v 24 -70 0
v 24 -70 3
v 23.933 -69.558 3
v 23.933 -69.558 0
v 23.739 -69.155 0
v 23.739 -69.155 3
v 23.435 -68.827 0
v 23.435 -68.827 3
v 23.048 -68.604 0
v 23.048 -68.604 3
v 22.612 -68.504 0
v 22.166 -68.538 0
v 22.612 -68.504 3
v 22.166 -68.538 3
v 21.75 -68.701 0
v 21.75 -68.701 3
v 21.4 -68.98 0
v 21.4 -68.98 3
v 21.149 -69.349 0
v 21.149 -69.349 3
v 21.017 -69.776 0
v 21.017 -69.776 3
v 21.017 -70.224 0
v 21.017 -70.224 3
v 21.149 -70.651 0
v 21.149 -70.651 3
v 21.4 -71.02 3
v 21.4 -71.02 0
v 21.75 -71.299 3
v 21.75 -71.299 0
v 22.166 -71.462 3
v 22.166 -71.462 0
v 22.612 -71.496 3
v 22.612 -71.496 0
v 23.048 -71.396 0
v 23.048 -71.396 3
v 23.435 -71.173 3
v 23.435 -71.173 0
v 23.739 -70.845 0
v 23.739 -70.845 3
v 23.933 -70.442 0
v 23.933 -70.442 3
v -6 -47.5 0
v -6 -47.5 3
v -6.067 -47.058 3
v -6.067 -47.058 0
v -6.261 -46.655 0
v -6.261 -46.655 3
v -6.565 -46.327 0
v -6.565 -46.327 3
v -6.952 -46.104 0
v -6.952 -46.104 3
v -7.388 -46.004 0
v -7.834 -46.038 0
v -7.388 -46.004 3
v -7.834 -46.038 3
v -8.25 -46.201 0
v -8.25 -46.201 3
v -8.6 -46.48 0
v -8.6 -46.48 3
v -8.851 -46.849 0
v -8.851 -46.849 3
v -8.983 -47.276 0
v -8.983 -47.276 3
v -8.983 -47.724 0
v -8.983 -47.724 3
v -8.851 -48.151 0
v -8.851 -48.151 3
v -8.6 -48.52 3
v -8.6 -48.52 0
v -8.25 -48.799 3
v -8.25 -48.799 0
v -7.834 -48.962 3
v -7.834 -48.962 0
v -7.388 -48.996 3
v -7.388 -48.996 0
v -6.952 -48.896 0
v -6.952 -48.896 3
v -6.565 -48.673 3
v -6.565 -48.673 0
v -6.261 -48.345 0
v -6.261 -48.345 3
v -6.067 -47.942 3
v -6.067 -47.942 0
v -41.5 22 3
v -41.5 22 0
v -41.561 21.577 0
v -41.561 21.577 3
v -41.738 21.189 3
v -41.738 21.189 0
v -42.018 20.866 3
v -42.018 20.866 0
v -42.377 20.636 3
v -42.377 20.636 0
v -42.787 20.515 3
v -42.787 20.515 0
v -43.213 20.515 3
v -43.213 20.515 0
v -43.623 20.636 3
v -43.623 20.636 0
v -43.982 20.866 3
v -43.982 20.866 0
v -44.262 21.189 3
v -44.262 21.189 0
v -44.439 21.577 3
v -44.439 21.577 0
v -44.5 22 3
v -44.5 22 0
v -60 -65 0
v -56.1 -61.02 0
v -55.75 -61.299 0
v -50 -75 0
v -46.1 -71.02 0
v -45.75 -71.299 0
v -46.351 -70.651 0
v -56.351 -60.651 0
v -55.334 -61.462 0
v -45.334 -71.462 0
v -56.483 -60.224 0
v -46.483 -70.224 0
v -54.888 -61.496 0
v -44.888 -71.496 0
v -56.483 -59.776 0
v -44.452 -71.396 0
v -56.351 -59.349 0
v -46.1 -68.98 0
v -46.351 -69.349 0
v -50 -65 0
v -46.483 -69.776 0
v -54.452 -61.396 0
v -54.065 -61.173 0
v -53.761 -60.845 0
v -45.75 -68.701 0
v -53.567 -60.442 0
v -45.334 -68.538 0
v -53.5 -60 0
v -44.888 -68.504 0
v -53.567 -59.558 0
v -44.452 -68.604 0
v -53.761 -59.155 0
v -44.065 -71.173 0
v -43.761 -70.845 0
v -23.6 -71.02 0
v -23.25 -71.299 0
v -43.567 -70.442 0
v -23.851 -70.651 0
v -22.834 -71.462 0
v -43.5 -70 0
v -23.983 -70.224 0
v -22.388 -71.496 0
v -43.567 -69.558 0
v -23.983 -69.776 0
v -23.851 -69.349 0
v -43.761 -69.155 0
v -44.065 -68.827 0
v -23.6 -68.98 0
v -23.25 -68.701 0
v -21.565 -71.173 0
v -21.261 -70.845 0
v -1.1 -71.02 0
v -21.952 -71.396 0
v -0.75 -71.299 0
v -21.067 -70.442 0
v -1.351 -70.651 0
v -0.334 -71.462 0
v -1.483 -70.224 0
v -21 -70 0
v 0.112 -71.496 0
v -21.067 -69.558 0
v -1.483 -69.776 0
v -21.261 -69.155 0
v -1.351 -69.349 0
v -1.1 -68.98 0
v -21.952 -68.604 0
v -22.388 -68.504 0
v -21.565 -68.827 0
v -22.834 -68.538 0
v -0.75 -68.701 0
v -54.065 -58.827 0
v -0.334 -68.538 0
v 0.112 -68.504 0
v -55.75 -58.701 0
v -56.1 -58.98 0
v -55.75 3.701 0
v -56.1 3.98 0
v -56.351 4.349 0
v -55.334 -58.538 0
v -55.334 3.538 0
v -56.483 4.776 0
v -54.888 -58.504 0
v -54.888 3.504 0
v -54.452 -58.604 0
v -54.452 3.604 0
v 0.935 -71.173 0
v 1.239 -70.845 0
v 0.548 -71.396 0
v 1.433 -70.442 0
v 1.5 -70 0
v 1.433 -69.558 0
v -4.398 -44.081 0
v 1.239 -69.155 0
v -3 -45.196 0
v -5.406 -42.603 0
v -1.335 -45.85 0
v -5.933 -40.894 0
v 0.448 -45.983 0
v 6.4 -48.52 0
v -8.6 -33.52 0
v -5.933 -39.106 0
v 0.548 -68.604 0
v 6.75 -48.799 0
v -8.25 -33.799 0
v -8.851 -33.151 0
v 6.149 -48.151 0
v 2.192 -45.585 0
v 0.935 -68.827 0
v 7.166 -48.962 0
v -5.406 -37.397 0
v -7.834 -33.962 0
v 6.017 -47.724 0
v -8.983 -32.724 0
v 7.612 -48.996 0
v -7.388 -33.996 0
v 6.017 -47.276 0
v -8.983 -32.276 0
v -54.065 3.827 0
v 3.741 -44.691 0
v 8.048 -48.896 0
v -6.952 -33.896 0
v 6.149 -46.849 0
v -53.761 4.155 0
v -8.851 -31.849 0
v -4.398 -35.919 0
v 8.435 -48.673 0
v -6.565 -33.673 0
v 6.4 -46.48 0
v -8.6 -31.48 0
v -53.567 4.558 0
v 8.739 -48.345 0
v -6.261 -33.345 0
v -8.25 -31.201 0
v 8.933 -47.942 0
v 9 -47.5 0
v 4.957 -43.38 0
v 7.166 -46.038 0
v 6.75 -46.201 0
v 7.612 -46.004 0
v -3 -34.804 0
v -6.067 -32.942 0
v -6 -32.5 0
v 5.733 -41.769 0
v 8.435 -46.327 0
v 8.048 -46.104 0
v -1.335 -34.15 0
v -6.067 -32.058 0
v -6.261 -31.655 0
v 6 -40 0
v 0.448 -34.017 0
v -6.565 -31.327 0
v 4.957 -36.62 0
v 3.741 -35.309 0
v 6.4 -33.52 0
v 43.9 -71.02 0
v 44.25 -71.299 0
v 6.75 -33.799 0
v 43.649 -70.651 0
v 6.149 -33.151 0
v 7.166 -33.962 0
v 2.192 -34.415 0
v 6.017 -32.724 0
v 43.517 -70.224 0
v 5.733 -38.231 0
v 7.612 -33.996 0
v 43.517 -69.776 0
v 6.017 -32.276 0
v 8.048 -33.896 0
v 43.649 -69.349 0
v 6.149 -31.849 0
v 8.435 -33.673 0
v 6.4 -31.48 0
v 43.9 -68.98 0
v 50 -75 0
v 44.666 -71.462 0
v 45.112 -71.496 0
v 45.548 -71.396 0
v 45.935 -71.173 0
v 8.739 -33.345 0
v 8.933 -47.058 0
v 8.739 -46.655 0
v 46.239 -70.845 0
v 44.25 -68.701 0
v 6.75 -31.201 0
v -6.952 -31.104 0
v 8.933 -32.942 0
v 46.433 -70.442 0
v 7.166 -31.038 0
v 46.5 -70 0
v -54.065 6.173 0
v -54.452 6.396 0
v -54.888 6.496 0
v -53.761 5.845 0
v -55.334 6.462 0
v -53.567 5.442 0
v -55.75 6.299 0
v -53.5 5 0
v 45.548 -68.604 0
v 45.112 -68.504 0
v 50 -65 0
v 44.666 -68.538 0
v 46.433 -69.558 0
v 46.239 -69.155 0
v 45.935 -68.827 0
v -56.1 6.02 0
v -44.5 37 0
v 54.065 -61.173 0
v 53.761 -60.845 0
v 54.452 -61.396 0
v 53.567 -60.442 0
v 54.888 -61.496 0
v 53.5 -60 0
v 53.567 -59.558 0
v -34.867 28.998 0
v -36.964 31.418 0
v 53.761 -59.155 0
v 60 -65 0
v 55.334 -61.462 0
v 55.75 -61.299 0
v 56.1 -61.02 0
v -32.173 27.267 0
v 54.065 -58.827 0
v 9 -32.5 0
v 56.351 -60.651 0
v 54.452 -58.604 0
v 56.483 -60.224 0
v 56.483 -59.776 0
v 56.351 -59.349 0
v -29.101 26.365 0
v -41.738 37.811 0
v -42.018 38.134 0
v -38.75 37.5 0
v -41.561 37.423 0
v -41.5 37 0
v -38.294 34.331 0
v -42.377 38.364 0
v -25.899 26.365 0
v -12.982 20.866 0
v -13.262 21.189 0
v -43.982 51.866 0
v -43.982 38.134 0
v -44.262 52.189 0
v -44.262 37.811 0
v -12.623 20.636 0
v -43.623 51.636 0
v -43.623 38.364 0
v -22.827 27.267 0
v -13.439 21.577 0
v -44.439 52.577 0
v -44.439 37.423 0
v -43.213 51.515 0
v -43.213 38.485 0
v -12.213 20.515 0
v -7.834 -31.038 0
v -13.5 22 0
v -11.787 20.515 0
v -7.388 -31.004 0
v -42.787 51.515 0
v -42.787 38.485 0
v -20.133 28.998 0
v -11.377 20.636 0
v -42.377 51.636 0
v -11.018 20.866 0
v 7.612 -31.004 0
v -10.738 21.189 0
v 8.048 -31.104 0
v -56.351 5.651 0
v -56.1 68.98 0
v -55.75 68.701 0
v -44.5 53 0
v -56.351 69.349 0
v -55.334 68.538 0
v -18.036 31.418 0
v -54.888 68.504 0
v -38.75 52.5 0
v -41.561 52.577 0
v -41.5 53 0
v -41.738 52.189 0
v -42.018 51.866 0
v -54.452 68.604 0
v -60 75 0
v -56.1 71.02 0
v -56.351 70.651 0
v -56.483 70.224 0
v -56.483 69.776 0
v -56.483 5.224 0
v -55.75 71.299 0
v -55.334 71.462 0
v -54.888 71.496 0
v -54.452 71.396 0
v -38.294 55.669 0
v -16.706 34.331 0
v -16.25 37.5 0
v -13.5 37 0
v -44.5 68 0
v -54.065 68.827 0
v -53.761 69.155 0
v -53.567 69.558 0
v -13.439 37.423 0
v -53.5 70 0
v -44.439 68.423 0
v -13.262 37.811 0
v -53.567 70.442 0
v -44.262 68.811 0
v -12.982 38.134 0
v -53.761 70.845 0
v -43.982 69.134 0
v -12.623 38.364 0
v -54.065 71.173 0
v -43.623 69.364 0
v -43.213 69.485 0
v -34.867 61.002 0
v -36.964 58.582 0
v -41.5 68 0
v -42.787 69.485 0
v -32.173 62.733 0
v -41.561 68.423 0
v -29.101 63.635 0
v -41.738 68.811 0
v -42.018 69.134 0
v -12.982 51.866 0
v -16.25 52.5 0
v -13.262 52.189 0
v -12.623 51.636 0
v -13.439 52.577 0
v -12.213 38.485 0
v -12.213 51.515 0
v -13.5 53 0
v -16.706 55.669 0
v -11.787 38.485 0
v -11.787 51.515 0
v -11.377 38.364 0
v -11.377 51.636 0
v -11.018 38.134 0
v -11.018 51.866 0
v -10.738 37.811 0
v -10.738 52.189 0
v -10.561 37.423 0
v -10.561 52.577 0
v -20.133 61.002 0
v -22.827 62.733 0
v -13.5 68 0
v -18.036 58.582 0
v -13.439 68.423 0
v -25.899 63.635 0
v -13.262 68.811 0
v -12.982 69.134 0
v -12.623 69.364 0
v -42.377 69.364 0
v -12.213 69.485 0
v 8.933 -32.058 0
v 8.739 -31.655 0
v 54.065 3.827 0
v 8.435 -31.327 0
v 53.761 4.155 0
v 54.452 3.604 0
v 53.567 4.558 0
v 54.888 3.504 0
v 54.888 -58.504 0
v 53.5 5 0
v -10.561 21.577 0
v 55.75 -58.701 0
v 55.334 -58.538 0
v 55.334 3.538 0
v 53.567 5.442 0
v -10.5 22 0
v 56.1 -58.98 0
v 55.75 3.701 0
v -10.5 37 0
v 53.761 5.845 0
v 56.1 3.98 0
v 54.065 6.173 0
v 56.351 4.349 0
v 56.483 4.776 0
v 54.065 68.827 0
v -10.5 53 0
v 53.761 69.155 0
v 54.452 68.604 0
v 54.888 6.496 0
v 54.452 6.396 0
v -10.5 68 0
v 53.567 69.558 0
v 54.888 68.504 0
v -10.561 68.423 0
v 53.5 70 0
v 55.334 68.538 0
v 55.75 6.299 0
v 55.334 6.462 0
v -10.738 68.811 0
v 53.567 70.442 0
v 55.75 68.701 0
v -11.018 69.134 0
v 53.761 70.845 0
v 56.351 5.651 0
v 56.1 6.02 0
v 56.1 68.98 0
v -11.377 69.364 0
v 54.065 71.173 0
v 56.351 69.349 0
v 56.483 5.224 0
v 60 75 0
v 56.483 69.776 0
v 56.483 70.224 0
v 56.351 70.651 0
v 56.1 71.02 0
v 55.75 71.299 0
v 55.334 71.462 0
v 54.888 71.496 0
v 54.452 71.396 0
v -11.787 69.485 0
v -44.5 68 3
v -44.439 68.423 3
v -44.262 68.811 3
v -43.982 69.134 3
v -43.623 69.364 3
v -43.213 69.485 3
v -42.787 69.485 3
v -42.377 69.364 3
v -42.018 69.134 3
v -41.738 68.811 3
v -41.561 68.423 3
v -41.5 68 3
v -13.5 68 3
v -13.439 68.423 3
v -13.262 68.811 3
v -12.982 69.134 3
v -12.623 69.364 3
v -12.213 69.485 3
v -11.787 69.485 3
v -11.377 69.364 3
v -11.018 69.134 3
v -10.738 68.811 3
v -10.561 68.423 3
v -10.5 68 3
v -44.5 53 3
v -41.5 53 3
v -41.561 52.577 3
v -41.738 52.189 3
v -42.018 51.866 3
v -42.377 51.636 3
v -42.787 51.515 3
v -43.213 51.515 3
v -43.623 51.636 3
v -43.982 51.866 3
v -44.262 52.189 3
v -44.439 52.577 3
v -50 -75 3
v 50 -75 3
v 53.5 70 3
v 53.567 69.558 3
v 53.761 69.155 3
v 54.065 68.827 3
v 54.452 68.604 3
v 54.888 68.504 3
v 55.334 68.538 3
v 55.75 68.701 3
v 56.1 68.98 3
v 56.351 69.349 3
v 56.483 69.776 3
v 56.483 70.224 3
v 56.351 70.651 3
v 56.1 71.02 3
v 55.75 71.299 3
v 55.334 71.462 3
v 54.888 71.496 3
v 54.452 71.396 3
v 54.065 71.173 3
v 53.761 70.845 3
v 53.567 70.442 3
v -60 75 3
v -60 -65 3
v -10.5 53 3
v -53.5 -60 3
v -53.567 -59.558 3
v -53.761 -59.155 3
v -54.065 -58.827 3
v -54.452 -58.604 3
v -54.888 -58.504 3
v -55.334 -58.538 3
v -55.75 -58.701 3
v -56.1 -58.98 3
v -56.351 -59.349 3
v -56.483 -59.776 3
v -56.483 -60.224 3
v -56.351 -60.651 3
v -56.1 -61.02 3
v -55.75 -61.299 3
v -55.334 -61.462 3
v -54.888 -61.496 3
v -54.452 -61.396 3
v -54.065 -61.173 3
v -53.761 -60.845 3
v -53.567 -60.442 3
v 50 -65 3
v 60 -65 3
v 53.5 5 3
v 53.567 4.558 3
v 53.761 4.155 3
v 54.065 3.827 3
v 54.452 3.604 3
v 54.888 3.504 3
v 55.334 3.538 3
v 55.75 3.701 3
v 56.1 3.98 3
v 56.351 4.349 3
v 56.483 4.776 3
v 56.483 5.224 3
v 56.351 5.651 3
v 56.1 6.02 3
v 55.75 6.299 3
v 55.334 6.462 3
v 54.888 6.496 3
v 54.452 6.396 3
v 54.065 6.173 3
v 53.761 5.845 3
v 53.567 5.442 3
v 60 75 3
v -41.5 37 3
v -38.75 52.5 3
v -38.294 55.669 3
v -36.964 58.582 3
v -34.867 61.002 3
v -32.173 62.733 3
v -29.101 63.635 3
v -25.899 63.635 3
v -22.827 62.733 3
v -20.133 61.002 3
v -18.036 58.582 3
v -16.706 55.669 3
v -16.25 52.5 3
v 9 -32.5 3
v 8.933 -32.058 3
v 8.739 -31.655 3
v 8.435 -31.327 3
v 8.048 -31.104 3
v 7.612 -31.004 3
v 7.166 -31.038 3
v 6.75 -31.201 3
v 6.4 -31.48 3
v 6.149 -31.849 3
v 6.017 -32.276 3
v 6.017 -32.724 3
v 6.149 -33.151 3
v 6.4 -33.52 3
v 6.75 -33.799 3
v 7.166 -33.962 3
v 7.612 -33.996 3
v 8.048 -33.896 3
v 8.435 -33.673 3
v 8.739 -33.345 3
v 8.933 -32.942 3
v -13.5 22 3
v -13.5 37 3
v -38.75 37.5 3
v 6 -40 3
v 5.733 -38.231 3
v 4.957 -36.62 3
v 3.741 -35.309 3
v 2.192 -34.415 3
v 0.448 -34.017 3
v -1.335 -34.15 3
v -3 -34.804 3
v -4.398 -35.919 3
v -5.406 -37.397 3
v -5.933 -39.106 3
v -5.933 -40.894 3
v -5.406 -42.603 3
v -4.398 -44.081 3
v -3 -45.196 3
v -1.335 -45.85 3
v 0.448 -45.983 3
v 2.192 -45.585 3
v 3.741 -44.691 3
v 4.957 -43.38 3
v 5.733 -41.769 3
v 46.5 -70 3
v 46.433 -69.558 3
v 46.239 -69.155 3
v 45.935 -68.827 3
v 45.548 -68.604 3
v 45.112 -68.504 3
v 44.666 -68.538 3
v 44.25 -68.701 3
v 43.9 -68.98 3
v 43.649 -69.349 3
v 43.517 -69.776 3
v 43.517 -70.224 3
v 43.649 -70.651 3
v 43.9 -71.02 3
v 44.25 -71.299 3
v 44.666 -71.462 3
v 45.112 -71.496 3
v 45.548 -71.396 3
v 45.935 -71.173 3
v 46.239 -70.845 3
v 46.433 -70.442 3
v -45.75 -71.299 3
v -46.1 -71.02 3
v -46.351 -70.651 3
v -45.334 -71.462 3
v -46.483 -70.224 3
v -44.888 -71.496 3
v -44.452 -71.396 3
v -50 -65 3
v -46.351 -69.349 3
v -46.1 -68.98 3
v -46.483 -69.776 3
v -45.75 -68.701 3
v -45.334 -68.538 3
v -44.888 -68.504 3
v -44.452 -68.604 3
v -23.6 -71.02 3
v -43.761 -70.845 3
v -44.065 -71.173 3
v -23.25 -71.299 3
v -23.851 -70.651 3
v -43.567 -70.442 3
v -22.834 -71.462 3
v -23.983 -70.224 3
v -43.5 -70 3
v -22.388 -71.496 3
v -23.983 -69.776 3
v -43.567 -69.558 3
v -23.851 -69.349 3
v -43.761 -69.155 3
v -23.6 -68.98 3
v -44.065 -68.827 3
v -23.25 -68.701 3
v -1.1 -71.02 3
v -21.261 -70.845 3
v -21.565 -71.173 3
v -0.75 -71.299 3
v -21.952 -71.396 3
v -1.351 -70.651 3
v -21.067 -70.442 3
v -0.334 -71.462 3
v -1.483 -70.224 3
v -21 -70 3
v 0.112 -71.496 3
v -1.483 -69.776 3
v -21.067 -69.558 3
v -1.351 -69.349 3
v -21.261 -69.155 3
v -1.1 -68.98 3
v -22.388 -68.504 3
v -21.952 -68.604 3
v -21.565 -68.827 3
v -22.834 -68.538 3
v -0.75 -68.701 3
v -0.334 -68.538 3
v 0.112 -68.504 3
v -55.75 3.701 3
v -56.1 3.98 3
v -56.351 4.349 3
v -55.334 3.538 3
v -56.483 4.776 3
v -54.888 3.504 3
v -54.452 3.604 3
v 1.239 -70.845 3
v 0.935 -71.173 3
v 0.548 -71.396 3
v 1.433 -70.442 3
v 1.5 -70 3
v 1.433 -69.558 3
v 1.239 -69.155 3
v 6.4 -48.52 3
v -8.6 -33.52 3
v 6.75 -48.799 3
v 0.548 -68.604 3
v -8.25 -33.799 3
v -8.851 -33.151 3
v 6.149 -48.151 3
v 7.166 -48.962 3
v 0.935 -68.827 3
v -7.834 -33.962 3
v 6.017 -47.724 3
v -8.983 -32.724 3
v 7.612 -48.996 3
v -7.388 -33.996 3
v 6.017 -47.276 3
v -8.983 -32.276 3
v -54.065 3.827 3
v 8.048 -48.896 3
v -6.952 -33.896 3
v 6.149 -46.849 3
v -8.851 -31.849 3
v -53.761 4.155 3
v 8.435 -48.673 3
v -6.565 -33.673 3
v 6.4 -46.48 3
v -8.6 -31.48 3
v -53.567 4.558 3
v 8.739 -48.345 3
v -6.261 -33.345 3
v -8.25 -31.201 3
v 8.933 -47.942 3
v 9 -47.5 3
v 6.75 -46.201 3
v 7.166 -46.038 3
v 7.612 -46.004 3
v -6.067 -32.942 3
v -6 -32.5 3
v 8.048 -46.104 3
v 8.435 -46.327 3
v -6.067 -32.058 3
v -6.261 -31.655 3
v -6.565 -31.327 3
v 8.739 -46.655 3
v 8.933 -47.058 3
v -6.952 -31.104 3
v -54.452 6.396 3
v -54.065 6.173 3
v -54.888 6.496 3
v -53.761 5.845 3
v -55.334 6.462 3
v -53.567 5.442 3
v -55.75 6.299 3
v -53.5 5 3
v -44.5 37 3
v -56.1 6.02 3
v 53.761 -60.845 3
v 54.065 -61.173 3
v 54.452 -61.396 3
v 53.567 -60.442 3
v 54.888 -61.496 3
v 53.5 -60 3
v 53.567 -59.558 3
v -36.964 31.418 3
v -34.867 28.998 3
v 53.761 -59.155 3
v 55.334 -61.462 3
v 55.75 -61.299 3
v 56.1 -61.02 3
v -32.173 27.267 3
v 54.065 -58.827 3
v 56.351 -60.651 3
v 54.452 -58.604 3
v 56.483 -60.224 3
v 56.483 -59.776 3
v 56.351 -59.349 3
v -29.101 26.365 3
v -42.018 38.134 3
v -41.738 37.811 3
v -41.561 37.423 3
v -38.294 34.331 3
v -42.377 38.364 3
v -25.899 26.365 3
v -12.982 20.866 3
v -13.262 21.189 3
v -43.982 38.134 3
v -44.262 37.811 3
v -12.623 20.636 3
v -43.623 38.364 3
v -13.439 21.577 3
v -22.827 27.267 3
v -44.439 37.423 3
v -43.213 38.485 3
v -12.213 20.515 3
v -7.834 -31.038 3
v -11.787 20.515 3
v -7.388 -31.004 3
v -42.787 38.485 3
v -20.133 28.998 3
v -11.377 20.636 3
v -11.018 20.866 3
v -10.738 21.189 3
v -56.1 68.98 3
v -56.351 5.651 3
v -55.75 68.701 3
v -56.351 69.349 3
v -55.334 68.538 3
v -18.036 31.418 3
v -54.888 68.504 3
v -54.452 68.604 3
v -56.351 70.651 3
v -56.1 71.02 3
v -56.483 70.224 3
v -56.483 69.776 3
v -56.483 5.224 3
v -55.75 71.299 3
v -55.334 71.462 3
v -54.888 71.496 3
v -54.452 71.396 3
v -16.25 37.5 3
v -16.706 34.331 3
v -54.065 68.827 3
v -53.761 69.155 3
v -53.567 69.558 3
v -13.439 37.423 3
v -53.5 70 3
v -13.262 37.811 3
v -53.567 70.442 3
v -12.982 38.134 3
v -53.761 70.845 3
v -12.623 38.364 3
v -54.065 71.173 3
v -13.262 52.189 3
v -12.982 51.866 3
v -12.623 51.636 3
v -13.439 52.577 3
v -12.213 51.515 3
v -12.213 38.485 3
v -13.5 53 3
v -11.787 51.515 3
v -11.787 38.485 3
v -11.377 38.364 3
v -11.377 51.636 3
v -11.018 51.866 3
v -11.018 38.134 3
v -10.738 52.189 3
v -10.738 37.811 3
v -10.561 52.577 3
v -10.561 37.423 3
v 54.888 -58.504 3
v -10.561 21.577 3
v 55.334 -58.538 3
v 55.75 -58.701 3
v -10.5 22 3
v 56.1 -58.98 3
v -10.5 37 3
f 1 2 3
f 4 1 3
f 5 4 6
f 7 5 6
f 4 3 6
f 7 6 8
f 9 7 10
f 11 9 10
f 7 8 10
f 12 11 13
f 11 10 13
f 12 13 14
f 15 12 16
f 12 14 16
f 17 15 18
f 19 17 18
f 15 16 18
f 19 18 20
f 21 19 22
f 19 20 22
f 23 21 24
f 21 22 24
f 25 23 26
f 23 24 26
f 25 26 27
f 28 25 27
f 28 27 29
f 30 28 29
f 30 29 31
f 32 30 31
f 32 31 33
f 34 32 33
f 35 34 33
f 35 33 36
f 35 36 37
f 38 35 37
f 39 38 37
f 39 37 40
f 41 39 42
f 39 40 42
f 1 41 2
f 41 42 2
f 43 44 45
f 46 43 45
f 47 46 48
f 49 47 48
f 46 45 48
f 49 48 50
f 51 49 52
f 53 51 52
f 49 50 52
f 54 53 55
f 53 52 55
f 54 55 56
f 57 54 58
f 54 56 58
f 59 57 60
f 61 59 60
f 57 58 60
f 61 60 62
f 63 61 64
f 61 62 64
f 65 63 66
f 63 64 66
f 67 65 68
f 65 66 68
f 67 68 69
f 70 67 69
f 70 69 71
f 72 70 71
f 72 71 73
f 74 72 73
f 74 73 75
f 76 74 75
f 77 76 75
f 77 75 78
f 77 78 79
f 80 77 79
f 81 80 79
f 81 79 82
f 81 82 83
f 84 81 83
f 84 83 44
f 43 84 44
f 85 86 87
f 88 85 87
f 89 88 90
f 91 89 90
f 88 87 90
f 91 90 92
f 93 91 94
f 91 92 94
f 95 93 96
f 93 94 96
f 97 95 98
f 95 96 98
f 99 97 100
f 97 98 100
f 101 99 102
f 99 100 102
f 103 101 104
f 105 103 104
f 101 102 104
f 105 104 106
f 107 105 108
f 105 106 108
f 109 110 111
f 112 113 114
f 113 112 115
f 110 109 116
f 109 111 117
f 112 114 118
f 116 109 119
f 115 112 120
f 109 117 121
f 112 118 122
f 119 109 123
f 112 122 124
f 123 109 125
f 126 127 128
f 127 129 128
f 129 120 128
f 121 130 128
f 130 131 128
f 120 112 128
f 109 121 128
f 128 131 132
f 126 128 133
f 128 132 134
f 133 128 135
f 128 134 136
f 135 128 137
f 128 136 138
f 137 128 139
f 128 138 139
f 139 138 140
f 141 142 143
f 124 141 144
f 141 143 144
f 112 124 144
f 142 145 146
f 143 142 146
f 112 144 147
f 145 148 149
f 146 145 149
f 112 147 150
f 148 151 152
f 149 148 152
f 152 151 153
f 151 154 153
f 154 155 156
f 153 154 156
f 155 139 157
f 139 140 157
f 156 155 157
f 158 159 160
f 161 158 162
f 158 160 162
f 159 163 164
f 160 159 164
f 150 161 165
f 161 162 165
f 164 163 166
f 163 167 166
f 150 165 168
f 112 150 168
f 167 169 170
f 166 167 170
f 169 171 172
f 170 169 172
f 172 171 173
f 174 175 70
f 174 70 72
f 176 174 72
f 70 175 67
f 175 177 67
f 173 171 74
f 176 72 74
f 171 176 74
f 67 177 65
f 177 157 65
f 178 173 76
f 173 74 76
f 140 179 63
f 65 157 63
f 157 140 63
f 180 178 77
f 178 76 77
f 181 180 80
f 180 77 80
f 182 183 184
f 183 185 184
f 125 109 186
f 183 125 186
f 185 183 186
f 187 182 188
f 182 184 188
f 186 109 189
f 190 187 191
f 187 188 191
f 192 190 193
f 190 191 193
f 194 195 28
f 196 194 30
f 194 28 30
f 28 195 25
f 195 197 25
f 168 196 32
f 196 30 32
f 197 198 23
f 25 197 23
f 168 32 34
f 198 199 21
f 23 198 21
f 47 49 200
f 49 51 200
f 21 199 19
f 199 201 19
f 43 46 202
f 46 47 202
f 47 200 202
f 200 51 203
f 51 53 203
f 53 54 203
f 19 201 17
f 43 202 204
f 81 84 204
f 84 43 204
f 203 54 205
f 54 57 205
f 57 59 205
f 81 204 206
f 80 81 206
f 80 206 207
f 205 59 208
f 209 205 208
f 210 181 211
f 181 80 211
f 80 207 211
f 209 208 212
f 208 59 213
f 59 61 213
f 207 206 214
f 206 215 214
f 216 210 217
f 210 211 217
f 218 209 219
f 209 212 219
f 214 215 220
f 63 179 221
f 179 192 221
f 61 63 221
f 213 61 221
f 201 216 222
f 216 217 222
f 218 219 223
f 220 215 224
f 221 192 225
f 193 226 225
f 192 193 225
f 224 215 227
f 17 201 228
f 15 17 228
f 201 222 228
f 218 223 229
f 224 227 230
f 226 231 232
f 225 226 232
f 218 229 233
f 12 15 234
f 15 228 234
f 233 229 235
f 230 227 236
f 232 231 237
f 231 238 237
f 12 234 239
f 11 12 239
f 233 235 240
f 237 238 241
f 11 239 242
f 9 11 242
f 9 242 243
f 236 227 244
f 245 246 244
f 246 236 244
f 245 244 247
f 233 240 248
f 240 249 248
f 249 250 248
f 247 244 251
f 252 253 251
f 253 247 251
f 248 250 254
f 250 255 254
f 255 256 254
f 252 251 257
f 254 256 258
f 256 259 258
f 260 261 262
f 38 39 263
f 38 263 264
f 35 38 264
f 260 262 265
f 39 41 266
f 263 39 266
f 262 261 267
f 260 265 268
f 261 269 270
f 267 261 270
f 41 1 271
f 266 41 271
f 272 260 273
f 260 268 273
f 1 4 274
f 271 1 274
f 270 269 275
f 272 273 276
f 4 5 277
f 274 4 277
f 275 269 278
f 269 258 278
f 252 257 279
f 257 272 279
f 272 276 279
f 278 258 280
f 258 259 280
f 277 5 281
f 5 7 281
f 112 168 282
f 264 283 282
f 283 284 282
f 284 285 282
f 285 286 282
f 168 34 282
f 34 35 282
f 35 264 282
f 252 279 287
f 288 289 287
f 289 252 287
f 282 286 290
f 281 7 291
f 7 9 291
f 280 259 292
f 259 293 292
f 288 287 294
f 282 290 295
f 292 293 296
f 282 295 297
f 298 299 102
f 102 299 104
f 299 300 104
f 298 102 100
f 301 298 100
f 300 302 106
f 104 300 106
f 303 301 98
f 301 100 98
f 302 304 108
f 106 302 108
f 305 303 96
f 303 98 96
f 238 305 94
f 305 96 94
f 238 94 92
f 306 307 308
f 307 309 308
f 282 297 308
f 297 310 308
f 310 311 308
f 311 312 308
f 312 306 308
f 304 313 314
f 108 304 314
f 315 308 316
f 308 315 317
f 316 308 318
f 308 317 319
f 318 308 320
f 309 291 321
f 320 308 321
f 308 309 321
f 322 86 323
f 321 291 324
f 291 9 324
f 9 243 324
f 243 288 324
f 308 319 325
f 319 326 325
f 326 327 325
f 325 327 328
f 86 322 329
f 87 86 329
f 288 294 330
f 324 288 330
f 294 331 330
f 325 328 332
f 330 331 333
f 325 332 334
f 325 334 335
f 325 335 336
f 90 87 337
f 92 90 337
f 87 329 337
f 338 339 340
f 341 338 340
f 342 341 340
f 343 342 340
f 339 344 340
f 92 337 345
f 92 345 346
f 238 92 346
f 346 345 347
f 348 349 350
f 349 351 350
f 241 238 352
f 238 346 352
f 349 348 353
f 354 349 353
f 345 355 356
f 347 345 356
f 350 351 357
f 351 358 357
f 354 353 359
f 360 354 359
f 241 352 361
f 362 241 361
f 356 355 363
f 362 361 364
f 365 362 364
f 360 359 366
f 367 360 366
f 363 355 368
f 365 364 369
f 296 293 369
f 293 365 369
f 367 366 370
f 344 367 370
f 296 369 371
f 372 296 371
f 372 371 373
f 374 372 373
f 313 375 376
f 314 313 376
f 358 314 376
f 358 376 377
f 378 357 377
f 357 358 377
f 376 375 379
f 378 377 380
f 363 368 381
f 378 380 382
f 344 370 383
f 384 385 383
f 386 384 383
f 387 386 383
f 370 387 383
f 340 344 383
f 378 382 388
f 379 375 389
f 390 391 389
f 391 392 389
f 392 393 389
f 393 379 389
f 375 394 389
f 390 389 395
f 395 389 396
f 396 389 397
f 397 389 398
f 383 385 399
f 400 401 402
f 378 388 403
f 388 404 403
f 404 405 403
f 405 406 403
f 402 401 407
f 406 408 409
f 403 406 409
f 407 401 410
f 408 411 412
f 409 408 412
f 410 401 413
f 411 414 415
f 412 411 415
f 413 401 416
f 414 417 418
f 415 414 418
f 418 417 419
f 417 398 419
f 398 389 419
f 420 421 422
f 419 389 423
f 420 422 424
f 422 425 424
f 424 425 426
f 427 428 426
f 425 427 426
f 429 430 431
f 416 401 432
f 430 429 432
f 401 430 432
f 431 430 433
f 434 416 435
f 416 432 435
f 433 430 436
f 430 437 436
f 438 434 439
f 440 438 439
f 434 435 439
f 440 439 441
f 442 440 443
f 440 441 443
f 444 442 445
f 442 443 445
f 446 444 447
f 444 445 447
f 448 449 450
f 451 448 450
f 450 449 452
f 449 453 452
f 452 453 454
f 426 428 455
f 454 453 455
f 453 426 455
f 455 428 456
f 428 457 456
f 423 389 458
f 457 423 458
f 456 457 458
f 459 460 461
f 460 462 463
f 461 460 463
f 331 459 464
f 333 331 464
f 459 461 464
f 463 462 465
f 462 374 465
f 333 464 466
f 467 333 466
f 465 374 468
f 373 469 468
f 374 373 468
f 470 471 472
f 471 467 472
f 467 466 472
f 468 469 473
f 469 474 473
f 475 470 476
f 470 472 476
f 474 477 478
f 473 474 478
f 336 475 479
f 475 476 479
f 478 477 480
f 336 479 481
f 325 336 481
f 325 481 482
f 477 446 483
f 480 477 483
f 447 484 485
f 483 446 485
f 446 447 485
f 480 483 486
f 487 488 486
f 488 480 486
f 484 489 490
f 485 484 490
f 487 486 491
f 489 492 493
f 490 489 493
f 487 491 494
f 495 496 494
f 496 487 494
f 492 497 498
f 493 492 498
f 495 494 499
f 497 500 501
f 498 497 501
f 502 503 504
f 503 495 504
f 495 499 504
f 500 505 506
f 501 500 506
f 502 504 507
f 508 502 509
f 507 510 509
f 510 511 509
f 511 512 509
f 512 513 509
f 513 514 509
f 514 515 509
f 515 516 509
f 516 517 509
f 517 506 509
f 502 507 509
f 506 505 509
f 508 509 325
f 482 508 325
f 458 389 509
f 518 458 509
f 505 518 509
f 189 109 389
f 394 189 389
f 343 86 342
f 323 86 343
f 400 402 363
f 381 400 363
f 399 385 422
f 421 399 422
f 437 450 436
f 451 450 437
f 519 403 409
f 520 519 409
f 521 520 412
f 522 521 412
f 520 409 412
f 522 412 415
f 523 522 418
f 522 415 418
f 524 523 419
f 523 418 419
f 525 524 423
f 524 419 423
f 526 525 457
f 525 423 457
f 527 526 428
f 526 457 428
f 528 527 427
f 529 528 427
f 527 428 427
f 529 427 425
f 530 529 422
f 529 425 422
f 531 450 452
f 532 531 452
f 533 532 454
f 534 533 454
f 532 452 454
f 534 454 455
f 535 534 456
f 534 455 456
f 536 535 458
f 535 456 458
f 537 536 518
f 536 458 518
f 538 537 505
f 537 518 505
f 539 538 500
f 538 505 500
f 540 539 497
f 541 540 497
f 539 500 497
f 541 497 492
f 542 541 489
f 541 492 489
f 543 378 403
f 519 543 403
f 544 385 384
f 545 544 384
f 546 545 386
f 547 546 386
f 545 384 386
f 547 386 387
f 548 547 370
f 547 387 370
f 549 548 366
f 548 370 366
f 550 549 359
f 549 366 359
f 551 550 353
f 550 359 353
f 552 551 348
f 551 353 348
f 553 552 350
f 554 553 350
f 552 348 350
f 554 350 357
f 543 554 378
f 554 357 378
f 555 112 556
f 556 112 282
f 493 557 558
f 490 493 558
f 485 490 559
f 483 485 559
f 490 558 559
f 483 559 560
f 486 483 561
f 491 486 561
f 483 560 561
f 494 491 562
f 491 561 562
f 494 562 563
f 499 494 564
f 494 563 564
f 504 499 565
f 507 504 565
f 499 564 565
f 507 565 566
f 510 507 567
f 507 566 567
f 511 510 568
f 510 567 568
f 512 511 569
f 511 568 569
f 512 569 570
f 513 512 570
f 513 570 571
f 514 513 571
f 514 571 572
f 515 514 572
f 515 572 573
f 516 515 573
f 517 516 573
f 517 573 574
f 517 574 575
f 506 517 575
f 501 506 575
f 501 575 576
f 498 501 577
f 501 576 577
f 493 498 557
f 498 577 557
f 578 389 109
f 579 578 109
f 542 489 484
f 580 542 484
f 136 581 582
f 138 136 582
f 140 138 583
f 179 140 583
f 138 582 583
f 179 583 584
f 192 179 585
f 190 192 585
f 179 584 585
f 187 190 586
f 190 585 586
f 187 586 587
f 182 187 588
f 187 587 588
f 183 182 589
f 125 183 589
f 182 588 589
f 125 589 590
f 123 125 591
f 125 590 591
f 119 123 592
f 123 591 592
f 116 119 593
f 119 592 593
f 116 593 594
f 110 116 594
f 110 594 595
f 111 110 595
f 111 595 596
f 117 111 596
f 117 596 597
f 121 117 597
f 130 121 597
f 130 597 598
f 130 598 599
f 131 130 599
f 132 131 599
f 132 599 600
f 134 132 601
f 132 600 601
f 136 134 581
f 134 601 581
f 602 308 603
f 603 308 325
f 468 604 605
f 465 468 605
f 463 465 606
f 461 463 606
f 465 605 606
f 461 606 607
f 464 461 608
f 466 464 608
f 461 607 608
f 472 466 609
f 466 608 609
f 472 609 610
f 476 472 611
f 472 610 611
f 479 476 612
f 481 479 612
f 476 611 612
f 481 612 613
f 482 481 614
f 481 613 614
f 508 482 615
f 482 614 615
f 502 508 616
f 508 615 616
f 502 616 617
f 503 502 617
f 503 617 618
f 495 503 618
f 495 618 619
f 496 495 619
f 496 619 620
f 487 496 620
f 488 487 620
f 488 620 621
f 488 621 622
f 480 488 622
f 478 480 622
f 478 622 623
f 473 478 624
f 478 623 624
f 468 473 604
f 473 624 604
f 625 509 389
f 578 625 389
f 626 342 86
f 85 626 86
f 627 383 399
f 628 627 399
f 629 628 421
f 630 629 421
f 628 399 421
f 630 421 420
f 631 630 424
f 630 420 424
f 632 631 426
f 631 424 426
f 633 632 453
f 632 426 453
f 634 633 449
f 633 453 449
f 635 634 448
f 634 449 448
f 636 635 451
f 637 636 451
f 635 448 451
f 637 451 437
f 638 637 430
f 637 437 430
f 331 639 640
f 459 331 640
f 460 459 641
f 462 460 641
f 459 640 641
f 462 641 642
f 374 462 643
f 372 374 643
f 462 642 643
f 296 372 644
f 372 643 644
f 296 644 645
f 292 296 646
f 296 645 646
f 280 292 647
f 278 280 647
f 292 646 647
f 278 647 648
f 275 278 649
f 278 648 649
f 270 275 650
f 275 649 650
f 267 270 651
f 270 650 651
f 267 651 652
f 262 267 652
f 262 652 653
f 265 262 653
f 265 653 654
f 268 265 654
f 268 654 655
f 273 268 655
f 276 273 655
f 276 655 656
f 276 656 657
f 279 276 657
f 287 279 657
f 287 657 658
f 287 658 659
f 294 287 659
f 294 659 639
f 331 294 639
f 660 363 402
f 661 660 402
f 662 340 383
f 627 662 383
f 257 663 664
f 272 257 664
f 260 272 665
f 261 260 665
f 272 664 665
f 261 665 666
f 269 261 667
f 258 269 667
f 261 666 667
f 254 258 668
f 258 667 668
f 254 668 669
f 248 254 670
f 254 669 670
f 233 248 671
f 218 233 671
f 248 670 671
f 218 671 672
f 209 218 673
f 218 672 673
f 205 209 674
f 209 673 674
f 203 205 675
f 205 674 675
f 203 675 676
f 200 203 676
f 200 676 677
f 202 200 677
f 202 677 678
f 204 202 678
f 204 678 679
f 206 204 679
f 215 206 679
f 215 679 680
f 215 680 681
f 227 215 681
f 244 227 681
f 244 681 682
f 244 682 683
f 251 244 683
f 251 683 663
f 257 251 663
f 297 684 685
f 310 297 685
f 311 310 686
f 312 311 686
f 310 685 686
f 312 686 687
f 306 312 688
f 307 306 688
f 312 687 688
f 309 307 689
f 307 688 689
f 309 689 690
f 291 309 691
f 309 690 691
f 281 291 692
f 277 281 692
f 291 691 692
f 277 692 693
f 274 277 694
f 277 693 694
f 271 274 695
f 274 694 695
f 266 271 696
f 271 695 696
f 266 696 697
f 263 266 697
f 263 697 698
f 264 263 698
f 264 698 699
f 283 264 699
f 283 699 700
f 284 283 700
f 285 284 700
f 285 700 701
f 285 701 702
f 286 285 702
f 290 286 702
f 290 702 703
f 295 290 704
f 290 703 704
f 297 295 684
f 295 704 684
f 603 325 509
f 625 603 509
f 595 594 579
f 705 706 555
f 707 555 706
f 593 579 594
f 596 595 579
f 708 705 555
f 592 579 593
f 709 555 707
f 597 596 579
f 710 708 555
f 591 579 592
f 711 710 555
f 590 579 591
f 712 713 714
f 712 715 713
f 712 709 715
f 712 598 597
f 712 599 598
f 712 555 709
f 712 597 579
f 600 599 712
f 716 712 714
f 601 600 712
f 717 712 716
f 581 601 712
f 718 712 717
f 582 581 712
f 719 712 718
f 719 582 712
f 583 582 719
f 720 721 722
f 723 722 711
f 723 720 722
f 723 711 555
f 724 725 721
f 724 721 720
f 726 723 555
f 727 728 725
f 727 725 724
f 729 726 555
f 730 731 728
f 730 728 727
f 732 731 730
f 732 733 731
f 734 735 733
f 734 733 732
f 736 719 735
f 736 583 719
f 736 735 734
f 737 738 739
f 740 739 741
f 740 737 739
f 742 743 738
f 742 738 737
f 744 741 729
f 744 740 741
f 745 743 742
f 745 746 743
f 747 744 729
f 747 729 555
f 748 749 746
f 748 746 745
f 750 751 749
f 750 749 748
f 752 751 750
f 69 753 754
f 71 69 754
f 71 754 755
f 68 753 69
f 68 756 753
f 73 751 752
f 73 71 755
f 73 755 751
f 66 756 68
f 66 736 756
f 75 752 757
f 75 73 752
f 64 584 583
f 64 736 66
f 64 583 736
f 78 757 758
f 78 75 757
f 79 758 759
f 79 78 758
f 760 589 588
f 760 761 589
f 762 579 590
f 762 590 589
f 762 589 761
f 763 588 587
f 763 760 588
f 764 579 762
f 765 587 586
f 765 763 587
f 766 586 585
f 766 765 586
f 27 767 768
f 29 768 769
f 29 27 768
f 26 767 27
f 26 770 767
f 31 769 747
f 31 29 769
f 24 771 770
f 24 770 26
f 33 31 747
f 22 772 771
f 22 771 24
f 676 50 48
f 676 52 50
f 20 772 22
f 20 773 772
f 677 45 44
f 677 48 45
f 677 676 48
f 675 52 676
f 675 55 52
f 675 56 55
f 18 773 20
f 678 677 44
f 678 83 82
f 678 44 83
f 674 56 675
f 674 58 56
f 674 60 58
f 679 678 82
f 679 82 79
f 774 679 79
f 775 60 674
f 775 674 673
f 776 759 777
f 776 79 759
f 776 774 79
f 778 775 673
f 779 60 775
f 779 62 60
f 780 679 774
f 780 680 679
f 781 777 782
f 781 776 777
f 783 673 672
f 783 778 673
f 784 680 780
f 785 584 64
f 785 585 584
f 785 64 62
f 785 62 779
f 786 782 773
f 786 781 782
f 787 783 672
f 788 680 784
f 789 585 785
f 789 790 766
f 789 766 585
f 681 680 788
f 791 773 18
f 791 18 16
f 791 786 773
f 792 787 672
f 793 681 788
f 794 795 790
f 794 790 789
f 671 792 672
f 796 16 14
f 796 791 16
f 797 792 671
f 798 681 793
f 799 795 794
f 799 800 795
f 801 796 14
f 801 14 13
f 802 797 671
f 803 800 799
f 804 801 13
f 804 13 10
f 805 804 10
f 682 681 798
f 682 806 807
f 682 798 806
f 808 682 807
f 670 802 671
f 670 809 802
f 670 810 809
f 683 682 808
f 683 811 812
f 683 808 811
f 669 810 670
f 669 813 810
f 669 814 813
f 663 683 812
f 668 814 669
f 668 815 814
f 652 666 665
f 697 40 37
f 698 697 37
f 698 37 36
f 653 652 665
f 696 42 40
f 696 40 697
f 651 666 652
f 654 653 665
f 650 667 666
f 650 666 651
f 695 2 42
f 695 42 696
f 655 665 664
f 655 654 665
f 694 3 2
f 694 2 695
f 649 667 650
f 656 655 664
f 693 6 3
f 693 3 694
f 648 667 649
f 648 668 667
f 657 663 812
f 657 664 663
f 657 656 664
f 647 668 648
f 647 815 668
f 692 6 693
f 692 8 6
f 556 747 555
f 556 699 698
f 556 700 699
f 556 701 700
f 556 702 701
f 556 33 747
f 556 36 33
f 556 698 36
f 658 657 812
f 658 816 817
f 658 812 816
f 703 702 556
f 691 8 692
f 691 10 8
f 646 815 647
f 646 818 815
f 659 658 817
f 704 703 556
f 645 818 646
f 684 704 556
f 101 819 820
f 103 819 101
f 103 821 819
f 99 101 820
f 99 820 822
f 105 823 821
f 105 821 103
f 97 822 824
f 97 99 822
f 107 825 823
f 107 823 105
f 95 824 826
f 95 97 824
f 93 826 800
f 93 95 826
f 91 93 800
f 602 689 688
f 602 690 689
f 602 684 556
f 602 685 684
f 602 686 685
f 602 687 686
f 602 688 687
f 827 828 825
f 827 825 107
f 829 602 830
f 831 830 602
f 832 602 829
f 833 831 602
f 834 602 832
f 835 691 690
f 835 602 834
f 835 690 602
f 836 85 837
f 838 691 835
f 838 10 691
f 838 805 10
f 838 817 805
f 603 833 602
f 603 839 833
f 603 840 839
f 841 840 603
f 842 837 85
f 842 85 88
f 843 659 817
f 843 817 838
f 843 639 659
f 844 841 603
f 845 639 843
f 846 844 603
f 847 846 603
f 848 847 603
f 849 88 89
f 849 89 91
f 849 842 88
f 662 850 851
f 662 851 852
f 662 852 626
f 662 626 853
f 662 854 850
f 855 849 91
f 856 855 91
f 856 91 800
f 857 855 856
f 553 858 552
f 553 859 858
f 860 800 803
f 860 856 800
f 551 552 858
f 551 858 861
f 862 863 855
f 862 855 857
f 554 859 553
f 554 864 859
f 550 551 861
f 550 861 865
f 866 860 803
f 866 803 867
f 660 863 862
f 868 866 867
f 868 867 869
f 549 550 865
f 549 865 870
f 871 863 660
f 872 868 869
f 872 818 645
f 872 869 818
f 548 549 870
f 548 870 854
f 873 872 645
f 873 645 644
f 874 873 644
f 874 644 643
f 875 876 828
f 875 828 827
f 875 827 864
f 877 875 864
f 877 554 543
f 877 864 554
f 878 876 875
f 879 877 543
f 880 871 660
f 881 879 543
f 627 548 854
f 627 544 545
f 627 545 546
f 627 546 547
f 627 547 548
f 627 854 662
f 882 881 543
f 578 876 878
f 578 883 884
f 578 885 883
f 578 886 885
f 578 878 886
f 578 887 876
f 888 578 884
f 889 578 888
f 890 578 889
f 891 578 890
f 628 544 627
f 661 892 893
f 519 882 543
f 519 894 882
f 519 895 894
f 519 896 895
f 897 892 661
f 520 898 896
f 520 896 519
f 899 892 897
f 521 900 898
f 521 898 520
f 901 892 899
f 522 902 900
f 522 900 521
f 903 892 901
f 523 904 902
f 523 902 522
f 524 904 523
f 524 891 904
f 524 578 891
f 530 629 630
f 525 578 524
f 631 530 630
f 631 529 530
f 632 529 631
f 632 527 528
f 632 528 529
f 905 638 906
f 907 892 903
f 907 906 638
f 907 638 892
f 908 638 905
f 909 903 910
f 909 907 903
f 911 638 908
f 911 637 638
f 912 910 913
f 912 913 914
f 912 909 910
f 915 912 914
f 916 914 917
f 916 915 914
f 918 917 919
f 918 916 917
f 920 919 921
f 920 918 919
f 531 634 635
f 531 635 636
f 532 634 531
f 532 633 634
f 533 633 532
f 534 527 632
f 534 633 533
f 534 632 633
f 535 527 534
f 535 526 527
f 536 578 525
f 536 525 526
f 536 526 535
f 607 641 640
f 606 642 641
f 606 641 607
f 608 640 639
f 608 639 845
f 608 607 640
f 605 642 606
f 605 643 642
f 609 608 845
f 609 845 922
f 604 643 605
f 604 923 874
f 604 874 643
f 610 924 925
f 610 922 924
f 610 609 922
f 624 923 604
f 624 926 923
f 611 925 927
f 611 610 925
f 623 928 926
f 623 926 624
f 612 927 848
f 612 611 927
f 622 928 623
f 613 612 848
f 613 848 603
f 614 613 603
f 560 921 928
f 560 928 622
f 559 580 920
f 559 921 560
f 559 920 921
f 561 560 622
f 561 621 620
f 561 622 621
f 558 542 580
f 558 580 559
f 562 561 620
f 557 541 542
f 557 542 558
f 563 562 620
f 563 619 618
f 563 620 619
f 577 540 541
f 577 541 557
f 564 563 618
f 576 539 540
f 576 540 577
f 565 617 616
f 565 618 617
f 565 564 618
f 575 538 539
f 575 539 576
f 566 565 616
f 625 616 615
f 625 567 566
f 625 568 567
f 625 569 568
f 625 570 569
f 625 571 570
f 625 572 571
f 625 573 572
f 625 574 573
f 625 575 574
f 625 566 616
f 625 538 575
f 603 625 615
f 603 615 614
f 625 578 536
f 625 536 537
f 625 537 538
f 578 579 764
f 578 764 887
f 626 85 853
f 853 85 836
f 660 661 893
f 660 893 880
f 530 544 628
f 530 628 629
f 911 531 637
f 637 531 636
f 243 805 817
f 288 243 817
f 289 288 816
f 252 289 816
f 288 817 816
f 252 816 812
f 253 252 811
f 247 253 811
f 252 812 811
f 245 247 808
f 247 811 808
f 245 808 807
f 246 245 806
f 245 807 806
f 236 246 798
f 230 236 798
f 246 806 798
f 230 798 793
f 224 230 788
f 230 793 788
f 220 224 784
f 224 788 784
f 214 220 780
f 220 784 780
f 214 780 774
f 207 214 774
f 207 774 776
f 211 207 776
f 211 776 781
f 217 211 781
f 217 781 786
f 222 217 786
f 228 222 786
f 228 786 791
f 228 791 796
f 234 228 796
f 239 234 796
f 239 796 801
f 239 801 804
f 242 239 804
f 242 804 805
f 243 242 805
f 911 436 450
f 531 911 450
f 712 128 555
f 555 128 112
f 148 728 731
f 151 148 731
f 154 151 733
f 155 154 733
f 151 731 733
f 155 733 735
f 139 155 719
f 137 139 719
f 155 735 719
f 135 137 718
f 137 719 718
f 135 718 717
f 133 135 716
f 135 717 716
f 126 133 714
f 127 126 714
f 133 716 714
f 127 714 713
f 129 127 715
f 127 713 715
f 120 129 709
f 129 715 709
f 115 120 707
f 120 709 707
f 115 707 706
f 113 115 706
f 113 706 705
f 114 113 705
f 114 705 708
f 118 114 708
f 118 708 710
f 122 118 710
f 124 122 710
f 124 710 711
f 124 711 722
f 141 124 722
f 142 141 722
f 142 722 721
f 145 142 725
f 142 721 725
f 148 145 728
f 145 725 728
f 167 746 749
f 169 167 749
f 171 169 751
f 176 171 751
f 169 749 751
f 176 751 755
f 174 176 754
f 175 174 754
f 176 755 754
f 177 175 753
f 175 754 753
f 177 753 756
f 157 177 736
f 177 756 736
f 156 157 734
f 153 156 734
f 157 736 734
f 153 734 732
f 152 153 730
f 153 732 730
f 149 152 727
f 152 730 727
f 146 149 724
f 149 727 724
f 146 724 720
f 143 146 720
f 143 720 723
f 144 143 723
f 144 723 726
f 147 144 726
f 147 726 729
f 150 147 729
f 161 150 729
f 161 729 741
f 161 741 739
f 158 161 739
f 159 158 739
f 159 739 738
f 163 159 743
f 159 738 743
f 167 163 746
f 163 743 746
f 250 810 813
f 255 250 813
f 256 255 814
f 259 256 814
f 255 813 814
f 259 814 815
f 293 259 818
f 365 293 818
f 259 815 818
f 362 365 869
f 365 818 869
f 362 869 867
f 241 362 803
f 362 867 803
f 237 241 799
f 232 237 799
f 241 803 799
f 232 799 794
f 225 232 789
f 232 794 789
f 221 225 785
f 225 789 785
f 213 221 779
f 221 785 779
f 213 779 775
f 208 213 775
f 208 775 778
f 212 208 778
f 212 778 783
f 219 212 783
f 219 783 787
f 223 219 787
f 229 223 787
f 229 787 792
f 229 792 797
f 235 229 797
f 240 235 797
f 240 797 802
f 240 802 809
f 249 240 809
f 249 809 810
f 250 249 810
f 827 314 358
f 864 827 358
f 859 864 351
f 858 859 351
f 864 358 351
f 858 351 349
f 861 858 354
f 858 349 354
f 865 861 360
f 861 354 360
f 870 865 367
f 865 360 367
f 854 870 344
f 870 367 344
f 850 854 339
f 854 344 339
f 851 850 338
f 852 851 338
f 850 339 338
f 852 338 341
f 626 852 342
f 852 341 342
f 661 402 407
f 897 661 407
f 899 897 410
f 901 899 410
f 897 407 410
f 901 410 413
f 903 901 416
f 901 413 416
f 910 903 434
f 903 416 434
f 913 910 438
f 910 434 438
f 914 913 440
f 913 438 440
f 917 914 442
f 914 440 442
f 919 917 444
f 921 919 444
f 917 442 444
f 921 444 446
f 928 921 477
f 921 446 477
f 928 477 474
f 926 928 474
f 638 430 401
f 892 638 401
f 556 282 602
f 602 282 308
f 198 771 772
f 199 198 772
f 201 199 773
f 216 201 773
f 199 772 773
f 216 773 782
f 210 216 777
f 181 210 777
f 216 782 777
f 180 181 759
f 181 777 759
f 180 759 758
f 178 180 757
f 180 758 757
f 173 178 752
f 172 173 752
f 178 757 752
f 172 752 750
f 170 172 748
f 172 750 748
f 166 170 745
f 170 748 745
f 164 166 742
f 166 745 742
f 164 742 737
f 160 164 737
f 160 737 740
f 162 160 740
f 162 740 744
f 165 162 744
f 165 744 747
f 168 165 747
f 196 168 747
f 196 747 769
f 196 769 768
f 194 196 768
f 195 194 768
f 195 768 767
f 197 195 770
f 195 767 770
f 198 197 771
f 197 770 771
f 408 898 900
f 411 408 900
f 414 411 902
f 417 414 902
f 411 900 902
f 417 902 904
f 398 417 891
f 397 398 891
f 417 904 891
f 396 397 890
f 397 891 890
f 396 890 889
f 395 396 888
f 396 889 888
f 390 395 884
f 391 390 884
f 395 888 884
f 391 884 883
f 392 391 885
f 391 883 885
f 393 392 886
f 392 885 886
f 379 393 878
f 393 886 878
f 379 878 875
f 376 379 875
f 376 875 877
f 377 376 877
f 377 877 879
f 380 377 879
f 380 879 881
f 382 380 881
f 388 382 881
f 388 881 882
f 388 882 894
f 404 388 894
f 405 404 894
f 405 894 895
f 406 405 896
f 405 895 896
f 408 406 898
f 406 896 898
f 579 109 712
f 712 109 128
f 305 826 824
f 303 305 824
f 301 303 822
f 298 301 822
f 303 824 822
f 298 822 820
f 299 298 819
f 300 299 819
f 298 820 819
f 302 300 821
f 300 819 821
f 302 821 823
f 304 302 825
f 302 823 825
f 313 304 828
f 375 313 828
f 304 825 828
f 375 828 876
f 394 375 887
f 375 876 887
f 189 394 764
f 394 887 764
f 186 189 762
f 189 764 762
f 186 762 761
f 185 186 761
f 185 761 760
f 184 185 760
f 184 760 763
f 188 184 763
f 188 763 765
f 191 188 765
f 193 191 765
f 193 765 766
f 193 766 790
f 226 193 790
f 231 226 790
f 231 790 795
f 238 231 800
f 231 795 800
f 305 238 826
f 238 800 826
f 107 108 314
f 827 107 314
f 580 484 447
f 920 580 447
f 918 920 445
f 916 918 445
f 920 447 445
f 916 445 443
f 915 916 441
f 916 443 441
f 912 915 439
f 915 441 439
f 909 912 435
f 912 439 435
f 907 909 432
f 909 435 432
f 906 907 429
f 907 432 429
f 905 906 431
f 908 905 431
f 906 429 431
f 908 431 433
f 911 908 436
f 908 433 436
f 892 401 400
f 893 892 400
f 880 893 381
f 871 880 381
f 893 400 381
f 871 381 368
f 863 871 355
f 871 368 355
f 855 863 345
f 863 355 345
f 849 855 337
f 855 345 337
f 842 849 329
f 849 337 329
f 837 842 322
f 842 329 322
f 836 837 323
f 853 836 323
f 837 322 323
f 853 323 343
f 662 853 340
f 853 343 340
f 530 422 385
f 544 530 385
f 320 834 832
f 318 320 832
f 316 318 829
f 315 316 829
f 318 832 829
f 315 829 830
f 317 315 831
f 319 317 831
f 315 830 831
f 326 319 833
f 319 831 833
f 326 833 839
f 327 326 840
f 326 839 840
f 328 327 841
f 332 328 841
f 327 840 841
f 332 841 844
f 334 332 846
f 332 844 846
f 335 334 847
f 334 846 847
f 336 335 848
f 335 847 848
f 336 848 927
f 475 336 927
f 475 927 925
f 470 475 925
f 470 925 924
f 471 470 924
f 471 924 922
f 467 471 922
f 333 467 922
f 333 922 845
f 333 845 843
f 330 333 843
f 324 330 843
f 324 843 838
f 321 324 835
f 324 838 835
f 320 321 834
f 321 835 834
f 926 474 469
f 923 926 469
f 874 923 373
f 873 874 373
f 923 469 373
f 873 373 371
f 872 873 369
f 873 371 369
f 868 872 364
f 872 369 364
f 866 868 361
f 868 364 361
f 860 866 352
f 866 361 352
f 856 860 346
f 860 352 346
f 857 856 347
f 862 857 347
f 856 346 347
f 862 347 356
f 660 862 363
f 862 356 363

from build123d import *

# Parameters (mm, degrees)
BOSS_EXTRU_1_DEPTH      = 3
ESQUISSE2_R             = 1.5
ENL_V_MAT_EXTRU_2_DEPTH = 3
ESQUISSE3_R             = 6
ESQUISSE3_R_2           = 1.5
ENL_V_MAT_EXTRU_3_DEPTH = 10


with BuildPart() as part:
    # Esquisse1 → Boss.-Extru.1 (new body)
    with BuildSketch(Plane.XY):
        Polygon((-50, -75), (50, -75), (50, -65), (60, -65), (60, 75), (-60, 75), (-60, -65), (-50, -65), align=None)
        with BuildLine():
            ThreePointArc((-41.5, 22), (-43, 20.5), (-44.5, 22))
            Line((-44.5, 22), (-44.5, 37))
            ThreePointArc((-44.5, 37), (-43, 38.5), (-41.5, 37))
            Line((-41.5, 37), (-41.5, 22))
        make_face(mode=Mode.SUBTRACT)
        with BuildLine():
            Line((-10.5, 37), (-10.5, 22))
            ThreePointArc((-10.5, 22), (-12, 20.5), (-13.5, 22))
            Line((-13.5, 22), (-13.5, 37))
            ThreePointArc((-13.5, 37), (-12, 38.5), (-10.5, 37))
        make_face(mode=Mode.SUBTRACT)
        with BuildLine():
            ThreePointArc((-41.5, 53), (-43, 51.5), (-44.5, 53))
            Line((-44.5, 53), (-44.5, 68))
            ThreePointArc((-44.5, 68), (-43, 69.5), (-41.5, 68))
            Line((-41.5, 68), (-41.5, 53))
        make_face(mode=Mode.SUBTRACT)
        with BuildLine():
            ThreePointArc((-16.25, 37.5), (-27.5, 26.25), (-38.75, 37.5))
            Line((-38.75, 37.5), (-38.75, 52.5))
            ThreePointArc((-38.75, 52.5), (-27.5, 63.75), (-16.25, 52.5))
            Line((-16.25, 52.5), (-16.25, 37.5))
        make_face(mode=Mode.SUBTRACT)
        with BuildLine():
            Line((-10.5, 68), (-10.5, 53))
            ThreePointArc((-10.5, 53), (-12, 51.5), (-13.5, 53))
            Line((-13.5, 53), (-13.5, 68))
            ThreePointArc((-13.5, 68), (-12, 69.5), (-10.5, 68))
        make_face(mode=Mode.SUBTRACT)
    extrude(amount=BOSS_EXTRU_1_DEPTH)

    # Esquisse2 → Enlèv. mat.-Extru.2 (cut)
    with BuildSketch(Plane.XY.offset(3)):
        with Locations((45, -70)):
            Circle(ESQUISSE2_R)
        with Locations((-55, -60)):
            Circle(ESQUISSE2_R)
        with Locations((-55, 5)):
            Circle(ESQUISSE2_R)
        with Locations((-55, 70)):
            Circle(ESQUISSE2_R)
        with Locations((22.5, -70)):
            Circle(ESQUISSE2_R)
        with Locations((0, -70)):
            Circle(ESQUISSE2_R)
        with Locations((-22.5, -70)):
            Circle(ESQUISSE2_R)
        with Locations((-45, -70)):
            Circle(ESQUISSE2_R)
        with Locations(Location((55, -60, 0), (0, 0, 180))):
            Circle(ESQUISSE2_R)
        with Locations(Location((55, 5, 0), (0, 0, 180))):
            Circle(ESQUISSE2_R)
        with Locations(Location((55, 70, 0), (0, 0, 180))):
            Circle(ESQUISSE2_R)
    extrude(amount=-ENL_V_MAT_EXTRU_2_DEPTH, mode=Mode.SUBTRACT)

    # Esquisse3 → Enlèv. mat.-Extru.3 (cut)
    with BuildSketch(Plane.XY.offset(3)):
        with Locations((0, -40)):
            Circle(ESQUISSE3_R)
        with Locations((-7.5, -32.5)):
            Circle(ESQUISSE3_R_2)
        with Locations((7.5, -32.5)):
            Circle(ESQUISSE3_R_2)
        with Locations((7.5, -47.5)):
            Circle(ESQUISSE3_R_2)
        with Locations((-7.5, -47.5)):
            Circle(ESQUISSE3_R_2)
    extrude(amount=-ENL_V_MAT_EXTRU_3_DEPTH, mode=Mode.SUBTRACT)


solid = part.part
